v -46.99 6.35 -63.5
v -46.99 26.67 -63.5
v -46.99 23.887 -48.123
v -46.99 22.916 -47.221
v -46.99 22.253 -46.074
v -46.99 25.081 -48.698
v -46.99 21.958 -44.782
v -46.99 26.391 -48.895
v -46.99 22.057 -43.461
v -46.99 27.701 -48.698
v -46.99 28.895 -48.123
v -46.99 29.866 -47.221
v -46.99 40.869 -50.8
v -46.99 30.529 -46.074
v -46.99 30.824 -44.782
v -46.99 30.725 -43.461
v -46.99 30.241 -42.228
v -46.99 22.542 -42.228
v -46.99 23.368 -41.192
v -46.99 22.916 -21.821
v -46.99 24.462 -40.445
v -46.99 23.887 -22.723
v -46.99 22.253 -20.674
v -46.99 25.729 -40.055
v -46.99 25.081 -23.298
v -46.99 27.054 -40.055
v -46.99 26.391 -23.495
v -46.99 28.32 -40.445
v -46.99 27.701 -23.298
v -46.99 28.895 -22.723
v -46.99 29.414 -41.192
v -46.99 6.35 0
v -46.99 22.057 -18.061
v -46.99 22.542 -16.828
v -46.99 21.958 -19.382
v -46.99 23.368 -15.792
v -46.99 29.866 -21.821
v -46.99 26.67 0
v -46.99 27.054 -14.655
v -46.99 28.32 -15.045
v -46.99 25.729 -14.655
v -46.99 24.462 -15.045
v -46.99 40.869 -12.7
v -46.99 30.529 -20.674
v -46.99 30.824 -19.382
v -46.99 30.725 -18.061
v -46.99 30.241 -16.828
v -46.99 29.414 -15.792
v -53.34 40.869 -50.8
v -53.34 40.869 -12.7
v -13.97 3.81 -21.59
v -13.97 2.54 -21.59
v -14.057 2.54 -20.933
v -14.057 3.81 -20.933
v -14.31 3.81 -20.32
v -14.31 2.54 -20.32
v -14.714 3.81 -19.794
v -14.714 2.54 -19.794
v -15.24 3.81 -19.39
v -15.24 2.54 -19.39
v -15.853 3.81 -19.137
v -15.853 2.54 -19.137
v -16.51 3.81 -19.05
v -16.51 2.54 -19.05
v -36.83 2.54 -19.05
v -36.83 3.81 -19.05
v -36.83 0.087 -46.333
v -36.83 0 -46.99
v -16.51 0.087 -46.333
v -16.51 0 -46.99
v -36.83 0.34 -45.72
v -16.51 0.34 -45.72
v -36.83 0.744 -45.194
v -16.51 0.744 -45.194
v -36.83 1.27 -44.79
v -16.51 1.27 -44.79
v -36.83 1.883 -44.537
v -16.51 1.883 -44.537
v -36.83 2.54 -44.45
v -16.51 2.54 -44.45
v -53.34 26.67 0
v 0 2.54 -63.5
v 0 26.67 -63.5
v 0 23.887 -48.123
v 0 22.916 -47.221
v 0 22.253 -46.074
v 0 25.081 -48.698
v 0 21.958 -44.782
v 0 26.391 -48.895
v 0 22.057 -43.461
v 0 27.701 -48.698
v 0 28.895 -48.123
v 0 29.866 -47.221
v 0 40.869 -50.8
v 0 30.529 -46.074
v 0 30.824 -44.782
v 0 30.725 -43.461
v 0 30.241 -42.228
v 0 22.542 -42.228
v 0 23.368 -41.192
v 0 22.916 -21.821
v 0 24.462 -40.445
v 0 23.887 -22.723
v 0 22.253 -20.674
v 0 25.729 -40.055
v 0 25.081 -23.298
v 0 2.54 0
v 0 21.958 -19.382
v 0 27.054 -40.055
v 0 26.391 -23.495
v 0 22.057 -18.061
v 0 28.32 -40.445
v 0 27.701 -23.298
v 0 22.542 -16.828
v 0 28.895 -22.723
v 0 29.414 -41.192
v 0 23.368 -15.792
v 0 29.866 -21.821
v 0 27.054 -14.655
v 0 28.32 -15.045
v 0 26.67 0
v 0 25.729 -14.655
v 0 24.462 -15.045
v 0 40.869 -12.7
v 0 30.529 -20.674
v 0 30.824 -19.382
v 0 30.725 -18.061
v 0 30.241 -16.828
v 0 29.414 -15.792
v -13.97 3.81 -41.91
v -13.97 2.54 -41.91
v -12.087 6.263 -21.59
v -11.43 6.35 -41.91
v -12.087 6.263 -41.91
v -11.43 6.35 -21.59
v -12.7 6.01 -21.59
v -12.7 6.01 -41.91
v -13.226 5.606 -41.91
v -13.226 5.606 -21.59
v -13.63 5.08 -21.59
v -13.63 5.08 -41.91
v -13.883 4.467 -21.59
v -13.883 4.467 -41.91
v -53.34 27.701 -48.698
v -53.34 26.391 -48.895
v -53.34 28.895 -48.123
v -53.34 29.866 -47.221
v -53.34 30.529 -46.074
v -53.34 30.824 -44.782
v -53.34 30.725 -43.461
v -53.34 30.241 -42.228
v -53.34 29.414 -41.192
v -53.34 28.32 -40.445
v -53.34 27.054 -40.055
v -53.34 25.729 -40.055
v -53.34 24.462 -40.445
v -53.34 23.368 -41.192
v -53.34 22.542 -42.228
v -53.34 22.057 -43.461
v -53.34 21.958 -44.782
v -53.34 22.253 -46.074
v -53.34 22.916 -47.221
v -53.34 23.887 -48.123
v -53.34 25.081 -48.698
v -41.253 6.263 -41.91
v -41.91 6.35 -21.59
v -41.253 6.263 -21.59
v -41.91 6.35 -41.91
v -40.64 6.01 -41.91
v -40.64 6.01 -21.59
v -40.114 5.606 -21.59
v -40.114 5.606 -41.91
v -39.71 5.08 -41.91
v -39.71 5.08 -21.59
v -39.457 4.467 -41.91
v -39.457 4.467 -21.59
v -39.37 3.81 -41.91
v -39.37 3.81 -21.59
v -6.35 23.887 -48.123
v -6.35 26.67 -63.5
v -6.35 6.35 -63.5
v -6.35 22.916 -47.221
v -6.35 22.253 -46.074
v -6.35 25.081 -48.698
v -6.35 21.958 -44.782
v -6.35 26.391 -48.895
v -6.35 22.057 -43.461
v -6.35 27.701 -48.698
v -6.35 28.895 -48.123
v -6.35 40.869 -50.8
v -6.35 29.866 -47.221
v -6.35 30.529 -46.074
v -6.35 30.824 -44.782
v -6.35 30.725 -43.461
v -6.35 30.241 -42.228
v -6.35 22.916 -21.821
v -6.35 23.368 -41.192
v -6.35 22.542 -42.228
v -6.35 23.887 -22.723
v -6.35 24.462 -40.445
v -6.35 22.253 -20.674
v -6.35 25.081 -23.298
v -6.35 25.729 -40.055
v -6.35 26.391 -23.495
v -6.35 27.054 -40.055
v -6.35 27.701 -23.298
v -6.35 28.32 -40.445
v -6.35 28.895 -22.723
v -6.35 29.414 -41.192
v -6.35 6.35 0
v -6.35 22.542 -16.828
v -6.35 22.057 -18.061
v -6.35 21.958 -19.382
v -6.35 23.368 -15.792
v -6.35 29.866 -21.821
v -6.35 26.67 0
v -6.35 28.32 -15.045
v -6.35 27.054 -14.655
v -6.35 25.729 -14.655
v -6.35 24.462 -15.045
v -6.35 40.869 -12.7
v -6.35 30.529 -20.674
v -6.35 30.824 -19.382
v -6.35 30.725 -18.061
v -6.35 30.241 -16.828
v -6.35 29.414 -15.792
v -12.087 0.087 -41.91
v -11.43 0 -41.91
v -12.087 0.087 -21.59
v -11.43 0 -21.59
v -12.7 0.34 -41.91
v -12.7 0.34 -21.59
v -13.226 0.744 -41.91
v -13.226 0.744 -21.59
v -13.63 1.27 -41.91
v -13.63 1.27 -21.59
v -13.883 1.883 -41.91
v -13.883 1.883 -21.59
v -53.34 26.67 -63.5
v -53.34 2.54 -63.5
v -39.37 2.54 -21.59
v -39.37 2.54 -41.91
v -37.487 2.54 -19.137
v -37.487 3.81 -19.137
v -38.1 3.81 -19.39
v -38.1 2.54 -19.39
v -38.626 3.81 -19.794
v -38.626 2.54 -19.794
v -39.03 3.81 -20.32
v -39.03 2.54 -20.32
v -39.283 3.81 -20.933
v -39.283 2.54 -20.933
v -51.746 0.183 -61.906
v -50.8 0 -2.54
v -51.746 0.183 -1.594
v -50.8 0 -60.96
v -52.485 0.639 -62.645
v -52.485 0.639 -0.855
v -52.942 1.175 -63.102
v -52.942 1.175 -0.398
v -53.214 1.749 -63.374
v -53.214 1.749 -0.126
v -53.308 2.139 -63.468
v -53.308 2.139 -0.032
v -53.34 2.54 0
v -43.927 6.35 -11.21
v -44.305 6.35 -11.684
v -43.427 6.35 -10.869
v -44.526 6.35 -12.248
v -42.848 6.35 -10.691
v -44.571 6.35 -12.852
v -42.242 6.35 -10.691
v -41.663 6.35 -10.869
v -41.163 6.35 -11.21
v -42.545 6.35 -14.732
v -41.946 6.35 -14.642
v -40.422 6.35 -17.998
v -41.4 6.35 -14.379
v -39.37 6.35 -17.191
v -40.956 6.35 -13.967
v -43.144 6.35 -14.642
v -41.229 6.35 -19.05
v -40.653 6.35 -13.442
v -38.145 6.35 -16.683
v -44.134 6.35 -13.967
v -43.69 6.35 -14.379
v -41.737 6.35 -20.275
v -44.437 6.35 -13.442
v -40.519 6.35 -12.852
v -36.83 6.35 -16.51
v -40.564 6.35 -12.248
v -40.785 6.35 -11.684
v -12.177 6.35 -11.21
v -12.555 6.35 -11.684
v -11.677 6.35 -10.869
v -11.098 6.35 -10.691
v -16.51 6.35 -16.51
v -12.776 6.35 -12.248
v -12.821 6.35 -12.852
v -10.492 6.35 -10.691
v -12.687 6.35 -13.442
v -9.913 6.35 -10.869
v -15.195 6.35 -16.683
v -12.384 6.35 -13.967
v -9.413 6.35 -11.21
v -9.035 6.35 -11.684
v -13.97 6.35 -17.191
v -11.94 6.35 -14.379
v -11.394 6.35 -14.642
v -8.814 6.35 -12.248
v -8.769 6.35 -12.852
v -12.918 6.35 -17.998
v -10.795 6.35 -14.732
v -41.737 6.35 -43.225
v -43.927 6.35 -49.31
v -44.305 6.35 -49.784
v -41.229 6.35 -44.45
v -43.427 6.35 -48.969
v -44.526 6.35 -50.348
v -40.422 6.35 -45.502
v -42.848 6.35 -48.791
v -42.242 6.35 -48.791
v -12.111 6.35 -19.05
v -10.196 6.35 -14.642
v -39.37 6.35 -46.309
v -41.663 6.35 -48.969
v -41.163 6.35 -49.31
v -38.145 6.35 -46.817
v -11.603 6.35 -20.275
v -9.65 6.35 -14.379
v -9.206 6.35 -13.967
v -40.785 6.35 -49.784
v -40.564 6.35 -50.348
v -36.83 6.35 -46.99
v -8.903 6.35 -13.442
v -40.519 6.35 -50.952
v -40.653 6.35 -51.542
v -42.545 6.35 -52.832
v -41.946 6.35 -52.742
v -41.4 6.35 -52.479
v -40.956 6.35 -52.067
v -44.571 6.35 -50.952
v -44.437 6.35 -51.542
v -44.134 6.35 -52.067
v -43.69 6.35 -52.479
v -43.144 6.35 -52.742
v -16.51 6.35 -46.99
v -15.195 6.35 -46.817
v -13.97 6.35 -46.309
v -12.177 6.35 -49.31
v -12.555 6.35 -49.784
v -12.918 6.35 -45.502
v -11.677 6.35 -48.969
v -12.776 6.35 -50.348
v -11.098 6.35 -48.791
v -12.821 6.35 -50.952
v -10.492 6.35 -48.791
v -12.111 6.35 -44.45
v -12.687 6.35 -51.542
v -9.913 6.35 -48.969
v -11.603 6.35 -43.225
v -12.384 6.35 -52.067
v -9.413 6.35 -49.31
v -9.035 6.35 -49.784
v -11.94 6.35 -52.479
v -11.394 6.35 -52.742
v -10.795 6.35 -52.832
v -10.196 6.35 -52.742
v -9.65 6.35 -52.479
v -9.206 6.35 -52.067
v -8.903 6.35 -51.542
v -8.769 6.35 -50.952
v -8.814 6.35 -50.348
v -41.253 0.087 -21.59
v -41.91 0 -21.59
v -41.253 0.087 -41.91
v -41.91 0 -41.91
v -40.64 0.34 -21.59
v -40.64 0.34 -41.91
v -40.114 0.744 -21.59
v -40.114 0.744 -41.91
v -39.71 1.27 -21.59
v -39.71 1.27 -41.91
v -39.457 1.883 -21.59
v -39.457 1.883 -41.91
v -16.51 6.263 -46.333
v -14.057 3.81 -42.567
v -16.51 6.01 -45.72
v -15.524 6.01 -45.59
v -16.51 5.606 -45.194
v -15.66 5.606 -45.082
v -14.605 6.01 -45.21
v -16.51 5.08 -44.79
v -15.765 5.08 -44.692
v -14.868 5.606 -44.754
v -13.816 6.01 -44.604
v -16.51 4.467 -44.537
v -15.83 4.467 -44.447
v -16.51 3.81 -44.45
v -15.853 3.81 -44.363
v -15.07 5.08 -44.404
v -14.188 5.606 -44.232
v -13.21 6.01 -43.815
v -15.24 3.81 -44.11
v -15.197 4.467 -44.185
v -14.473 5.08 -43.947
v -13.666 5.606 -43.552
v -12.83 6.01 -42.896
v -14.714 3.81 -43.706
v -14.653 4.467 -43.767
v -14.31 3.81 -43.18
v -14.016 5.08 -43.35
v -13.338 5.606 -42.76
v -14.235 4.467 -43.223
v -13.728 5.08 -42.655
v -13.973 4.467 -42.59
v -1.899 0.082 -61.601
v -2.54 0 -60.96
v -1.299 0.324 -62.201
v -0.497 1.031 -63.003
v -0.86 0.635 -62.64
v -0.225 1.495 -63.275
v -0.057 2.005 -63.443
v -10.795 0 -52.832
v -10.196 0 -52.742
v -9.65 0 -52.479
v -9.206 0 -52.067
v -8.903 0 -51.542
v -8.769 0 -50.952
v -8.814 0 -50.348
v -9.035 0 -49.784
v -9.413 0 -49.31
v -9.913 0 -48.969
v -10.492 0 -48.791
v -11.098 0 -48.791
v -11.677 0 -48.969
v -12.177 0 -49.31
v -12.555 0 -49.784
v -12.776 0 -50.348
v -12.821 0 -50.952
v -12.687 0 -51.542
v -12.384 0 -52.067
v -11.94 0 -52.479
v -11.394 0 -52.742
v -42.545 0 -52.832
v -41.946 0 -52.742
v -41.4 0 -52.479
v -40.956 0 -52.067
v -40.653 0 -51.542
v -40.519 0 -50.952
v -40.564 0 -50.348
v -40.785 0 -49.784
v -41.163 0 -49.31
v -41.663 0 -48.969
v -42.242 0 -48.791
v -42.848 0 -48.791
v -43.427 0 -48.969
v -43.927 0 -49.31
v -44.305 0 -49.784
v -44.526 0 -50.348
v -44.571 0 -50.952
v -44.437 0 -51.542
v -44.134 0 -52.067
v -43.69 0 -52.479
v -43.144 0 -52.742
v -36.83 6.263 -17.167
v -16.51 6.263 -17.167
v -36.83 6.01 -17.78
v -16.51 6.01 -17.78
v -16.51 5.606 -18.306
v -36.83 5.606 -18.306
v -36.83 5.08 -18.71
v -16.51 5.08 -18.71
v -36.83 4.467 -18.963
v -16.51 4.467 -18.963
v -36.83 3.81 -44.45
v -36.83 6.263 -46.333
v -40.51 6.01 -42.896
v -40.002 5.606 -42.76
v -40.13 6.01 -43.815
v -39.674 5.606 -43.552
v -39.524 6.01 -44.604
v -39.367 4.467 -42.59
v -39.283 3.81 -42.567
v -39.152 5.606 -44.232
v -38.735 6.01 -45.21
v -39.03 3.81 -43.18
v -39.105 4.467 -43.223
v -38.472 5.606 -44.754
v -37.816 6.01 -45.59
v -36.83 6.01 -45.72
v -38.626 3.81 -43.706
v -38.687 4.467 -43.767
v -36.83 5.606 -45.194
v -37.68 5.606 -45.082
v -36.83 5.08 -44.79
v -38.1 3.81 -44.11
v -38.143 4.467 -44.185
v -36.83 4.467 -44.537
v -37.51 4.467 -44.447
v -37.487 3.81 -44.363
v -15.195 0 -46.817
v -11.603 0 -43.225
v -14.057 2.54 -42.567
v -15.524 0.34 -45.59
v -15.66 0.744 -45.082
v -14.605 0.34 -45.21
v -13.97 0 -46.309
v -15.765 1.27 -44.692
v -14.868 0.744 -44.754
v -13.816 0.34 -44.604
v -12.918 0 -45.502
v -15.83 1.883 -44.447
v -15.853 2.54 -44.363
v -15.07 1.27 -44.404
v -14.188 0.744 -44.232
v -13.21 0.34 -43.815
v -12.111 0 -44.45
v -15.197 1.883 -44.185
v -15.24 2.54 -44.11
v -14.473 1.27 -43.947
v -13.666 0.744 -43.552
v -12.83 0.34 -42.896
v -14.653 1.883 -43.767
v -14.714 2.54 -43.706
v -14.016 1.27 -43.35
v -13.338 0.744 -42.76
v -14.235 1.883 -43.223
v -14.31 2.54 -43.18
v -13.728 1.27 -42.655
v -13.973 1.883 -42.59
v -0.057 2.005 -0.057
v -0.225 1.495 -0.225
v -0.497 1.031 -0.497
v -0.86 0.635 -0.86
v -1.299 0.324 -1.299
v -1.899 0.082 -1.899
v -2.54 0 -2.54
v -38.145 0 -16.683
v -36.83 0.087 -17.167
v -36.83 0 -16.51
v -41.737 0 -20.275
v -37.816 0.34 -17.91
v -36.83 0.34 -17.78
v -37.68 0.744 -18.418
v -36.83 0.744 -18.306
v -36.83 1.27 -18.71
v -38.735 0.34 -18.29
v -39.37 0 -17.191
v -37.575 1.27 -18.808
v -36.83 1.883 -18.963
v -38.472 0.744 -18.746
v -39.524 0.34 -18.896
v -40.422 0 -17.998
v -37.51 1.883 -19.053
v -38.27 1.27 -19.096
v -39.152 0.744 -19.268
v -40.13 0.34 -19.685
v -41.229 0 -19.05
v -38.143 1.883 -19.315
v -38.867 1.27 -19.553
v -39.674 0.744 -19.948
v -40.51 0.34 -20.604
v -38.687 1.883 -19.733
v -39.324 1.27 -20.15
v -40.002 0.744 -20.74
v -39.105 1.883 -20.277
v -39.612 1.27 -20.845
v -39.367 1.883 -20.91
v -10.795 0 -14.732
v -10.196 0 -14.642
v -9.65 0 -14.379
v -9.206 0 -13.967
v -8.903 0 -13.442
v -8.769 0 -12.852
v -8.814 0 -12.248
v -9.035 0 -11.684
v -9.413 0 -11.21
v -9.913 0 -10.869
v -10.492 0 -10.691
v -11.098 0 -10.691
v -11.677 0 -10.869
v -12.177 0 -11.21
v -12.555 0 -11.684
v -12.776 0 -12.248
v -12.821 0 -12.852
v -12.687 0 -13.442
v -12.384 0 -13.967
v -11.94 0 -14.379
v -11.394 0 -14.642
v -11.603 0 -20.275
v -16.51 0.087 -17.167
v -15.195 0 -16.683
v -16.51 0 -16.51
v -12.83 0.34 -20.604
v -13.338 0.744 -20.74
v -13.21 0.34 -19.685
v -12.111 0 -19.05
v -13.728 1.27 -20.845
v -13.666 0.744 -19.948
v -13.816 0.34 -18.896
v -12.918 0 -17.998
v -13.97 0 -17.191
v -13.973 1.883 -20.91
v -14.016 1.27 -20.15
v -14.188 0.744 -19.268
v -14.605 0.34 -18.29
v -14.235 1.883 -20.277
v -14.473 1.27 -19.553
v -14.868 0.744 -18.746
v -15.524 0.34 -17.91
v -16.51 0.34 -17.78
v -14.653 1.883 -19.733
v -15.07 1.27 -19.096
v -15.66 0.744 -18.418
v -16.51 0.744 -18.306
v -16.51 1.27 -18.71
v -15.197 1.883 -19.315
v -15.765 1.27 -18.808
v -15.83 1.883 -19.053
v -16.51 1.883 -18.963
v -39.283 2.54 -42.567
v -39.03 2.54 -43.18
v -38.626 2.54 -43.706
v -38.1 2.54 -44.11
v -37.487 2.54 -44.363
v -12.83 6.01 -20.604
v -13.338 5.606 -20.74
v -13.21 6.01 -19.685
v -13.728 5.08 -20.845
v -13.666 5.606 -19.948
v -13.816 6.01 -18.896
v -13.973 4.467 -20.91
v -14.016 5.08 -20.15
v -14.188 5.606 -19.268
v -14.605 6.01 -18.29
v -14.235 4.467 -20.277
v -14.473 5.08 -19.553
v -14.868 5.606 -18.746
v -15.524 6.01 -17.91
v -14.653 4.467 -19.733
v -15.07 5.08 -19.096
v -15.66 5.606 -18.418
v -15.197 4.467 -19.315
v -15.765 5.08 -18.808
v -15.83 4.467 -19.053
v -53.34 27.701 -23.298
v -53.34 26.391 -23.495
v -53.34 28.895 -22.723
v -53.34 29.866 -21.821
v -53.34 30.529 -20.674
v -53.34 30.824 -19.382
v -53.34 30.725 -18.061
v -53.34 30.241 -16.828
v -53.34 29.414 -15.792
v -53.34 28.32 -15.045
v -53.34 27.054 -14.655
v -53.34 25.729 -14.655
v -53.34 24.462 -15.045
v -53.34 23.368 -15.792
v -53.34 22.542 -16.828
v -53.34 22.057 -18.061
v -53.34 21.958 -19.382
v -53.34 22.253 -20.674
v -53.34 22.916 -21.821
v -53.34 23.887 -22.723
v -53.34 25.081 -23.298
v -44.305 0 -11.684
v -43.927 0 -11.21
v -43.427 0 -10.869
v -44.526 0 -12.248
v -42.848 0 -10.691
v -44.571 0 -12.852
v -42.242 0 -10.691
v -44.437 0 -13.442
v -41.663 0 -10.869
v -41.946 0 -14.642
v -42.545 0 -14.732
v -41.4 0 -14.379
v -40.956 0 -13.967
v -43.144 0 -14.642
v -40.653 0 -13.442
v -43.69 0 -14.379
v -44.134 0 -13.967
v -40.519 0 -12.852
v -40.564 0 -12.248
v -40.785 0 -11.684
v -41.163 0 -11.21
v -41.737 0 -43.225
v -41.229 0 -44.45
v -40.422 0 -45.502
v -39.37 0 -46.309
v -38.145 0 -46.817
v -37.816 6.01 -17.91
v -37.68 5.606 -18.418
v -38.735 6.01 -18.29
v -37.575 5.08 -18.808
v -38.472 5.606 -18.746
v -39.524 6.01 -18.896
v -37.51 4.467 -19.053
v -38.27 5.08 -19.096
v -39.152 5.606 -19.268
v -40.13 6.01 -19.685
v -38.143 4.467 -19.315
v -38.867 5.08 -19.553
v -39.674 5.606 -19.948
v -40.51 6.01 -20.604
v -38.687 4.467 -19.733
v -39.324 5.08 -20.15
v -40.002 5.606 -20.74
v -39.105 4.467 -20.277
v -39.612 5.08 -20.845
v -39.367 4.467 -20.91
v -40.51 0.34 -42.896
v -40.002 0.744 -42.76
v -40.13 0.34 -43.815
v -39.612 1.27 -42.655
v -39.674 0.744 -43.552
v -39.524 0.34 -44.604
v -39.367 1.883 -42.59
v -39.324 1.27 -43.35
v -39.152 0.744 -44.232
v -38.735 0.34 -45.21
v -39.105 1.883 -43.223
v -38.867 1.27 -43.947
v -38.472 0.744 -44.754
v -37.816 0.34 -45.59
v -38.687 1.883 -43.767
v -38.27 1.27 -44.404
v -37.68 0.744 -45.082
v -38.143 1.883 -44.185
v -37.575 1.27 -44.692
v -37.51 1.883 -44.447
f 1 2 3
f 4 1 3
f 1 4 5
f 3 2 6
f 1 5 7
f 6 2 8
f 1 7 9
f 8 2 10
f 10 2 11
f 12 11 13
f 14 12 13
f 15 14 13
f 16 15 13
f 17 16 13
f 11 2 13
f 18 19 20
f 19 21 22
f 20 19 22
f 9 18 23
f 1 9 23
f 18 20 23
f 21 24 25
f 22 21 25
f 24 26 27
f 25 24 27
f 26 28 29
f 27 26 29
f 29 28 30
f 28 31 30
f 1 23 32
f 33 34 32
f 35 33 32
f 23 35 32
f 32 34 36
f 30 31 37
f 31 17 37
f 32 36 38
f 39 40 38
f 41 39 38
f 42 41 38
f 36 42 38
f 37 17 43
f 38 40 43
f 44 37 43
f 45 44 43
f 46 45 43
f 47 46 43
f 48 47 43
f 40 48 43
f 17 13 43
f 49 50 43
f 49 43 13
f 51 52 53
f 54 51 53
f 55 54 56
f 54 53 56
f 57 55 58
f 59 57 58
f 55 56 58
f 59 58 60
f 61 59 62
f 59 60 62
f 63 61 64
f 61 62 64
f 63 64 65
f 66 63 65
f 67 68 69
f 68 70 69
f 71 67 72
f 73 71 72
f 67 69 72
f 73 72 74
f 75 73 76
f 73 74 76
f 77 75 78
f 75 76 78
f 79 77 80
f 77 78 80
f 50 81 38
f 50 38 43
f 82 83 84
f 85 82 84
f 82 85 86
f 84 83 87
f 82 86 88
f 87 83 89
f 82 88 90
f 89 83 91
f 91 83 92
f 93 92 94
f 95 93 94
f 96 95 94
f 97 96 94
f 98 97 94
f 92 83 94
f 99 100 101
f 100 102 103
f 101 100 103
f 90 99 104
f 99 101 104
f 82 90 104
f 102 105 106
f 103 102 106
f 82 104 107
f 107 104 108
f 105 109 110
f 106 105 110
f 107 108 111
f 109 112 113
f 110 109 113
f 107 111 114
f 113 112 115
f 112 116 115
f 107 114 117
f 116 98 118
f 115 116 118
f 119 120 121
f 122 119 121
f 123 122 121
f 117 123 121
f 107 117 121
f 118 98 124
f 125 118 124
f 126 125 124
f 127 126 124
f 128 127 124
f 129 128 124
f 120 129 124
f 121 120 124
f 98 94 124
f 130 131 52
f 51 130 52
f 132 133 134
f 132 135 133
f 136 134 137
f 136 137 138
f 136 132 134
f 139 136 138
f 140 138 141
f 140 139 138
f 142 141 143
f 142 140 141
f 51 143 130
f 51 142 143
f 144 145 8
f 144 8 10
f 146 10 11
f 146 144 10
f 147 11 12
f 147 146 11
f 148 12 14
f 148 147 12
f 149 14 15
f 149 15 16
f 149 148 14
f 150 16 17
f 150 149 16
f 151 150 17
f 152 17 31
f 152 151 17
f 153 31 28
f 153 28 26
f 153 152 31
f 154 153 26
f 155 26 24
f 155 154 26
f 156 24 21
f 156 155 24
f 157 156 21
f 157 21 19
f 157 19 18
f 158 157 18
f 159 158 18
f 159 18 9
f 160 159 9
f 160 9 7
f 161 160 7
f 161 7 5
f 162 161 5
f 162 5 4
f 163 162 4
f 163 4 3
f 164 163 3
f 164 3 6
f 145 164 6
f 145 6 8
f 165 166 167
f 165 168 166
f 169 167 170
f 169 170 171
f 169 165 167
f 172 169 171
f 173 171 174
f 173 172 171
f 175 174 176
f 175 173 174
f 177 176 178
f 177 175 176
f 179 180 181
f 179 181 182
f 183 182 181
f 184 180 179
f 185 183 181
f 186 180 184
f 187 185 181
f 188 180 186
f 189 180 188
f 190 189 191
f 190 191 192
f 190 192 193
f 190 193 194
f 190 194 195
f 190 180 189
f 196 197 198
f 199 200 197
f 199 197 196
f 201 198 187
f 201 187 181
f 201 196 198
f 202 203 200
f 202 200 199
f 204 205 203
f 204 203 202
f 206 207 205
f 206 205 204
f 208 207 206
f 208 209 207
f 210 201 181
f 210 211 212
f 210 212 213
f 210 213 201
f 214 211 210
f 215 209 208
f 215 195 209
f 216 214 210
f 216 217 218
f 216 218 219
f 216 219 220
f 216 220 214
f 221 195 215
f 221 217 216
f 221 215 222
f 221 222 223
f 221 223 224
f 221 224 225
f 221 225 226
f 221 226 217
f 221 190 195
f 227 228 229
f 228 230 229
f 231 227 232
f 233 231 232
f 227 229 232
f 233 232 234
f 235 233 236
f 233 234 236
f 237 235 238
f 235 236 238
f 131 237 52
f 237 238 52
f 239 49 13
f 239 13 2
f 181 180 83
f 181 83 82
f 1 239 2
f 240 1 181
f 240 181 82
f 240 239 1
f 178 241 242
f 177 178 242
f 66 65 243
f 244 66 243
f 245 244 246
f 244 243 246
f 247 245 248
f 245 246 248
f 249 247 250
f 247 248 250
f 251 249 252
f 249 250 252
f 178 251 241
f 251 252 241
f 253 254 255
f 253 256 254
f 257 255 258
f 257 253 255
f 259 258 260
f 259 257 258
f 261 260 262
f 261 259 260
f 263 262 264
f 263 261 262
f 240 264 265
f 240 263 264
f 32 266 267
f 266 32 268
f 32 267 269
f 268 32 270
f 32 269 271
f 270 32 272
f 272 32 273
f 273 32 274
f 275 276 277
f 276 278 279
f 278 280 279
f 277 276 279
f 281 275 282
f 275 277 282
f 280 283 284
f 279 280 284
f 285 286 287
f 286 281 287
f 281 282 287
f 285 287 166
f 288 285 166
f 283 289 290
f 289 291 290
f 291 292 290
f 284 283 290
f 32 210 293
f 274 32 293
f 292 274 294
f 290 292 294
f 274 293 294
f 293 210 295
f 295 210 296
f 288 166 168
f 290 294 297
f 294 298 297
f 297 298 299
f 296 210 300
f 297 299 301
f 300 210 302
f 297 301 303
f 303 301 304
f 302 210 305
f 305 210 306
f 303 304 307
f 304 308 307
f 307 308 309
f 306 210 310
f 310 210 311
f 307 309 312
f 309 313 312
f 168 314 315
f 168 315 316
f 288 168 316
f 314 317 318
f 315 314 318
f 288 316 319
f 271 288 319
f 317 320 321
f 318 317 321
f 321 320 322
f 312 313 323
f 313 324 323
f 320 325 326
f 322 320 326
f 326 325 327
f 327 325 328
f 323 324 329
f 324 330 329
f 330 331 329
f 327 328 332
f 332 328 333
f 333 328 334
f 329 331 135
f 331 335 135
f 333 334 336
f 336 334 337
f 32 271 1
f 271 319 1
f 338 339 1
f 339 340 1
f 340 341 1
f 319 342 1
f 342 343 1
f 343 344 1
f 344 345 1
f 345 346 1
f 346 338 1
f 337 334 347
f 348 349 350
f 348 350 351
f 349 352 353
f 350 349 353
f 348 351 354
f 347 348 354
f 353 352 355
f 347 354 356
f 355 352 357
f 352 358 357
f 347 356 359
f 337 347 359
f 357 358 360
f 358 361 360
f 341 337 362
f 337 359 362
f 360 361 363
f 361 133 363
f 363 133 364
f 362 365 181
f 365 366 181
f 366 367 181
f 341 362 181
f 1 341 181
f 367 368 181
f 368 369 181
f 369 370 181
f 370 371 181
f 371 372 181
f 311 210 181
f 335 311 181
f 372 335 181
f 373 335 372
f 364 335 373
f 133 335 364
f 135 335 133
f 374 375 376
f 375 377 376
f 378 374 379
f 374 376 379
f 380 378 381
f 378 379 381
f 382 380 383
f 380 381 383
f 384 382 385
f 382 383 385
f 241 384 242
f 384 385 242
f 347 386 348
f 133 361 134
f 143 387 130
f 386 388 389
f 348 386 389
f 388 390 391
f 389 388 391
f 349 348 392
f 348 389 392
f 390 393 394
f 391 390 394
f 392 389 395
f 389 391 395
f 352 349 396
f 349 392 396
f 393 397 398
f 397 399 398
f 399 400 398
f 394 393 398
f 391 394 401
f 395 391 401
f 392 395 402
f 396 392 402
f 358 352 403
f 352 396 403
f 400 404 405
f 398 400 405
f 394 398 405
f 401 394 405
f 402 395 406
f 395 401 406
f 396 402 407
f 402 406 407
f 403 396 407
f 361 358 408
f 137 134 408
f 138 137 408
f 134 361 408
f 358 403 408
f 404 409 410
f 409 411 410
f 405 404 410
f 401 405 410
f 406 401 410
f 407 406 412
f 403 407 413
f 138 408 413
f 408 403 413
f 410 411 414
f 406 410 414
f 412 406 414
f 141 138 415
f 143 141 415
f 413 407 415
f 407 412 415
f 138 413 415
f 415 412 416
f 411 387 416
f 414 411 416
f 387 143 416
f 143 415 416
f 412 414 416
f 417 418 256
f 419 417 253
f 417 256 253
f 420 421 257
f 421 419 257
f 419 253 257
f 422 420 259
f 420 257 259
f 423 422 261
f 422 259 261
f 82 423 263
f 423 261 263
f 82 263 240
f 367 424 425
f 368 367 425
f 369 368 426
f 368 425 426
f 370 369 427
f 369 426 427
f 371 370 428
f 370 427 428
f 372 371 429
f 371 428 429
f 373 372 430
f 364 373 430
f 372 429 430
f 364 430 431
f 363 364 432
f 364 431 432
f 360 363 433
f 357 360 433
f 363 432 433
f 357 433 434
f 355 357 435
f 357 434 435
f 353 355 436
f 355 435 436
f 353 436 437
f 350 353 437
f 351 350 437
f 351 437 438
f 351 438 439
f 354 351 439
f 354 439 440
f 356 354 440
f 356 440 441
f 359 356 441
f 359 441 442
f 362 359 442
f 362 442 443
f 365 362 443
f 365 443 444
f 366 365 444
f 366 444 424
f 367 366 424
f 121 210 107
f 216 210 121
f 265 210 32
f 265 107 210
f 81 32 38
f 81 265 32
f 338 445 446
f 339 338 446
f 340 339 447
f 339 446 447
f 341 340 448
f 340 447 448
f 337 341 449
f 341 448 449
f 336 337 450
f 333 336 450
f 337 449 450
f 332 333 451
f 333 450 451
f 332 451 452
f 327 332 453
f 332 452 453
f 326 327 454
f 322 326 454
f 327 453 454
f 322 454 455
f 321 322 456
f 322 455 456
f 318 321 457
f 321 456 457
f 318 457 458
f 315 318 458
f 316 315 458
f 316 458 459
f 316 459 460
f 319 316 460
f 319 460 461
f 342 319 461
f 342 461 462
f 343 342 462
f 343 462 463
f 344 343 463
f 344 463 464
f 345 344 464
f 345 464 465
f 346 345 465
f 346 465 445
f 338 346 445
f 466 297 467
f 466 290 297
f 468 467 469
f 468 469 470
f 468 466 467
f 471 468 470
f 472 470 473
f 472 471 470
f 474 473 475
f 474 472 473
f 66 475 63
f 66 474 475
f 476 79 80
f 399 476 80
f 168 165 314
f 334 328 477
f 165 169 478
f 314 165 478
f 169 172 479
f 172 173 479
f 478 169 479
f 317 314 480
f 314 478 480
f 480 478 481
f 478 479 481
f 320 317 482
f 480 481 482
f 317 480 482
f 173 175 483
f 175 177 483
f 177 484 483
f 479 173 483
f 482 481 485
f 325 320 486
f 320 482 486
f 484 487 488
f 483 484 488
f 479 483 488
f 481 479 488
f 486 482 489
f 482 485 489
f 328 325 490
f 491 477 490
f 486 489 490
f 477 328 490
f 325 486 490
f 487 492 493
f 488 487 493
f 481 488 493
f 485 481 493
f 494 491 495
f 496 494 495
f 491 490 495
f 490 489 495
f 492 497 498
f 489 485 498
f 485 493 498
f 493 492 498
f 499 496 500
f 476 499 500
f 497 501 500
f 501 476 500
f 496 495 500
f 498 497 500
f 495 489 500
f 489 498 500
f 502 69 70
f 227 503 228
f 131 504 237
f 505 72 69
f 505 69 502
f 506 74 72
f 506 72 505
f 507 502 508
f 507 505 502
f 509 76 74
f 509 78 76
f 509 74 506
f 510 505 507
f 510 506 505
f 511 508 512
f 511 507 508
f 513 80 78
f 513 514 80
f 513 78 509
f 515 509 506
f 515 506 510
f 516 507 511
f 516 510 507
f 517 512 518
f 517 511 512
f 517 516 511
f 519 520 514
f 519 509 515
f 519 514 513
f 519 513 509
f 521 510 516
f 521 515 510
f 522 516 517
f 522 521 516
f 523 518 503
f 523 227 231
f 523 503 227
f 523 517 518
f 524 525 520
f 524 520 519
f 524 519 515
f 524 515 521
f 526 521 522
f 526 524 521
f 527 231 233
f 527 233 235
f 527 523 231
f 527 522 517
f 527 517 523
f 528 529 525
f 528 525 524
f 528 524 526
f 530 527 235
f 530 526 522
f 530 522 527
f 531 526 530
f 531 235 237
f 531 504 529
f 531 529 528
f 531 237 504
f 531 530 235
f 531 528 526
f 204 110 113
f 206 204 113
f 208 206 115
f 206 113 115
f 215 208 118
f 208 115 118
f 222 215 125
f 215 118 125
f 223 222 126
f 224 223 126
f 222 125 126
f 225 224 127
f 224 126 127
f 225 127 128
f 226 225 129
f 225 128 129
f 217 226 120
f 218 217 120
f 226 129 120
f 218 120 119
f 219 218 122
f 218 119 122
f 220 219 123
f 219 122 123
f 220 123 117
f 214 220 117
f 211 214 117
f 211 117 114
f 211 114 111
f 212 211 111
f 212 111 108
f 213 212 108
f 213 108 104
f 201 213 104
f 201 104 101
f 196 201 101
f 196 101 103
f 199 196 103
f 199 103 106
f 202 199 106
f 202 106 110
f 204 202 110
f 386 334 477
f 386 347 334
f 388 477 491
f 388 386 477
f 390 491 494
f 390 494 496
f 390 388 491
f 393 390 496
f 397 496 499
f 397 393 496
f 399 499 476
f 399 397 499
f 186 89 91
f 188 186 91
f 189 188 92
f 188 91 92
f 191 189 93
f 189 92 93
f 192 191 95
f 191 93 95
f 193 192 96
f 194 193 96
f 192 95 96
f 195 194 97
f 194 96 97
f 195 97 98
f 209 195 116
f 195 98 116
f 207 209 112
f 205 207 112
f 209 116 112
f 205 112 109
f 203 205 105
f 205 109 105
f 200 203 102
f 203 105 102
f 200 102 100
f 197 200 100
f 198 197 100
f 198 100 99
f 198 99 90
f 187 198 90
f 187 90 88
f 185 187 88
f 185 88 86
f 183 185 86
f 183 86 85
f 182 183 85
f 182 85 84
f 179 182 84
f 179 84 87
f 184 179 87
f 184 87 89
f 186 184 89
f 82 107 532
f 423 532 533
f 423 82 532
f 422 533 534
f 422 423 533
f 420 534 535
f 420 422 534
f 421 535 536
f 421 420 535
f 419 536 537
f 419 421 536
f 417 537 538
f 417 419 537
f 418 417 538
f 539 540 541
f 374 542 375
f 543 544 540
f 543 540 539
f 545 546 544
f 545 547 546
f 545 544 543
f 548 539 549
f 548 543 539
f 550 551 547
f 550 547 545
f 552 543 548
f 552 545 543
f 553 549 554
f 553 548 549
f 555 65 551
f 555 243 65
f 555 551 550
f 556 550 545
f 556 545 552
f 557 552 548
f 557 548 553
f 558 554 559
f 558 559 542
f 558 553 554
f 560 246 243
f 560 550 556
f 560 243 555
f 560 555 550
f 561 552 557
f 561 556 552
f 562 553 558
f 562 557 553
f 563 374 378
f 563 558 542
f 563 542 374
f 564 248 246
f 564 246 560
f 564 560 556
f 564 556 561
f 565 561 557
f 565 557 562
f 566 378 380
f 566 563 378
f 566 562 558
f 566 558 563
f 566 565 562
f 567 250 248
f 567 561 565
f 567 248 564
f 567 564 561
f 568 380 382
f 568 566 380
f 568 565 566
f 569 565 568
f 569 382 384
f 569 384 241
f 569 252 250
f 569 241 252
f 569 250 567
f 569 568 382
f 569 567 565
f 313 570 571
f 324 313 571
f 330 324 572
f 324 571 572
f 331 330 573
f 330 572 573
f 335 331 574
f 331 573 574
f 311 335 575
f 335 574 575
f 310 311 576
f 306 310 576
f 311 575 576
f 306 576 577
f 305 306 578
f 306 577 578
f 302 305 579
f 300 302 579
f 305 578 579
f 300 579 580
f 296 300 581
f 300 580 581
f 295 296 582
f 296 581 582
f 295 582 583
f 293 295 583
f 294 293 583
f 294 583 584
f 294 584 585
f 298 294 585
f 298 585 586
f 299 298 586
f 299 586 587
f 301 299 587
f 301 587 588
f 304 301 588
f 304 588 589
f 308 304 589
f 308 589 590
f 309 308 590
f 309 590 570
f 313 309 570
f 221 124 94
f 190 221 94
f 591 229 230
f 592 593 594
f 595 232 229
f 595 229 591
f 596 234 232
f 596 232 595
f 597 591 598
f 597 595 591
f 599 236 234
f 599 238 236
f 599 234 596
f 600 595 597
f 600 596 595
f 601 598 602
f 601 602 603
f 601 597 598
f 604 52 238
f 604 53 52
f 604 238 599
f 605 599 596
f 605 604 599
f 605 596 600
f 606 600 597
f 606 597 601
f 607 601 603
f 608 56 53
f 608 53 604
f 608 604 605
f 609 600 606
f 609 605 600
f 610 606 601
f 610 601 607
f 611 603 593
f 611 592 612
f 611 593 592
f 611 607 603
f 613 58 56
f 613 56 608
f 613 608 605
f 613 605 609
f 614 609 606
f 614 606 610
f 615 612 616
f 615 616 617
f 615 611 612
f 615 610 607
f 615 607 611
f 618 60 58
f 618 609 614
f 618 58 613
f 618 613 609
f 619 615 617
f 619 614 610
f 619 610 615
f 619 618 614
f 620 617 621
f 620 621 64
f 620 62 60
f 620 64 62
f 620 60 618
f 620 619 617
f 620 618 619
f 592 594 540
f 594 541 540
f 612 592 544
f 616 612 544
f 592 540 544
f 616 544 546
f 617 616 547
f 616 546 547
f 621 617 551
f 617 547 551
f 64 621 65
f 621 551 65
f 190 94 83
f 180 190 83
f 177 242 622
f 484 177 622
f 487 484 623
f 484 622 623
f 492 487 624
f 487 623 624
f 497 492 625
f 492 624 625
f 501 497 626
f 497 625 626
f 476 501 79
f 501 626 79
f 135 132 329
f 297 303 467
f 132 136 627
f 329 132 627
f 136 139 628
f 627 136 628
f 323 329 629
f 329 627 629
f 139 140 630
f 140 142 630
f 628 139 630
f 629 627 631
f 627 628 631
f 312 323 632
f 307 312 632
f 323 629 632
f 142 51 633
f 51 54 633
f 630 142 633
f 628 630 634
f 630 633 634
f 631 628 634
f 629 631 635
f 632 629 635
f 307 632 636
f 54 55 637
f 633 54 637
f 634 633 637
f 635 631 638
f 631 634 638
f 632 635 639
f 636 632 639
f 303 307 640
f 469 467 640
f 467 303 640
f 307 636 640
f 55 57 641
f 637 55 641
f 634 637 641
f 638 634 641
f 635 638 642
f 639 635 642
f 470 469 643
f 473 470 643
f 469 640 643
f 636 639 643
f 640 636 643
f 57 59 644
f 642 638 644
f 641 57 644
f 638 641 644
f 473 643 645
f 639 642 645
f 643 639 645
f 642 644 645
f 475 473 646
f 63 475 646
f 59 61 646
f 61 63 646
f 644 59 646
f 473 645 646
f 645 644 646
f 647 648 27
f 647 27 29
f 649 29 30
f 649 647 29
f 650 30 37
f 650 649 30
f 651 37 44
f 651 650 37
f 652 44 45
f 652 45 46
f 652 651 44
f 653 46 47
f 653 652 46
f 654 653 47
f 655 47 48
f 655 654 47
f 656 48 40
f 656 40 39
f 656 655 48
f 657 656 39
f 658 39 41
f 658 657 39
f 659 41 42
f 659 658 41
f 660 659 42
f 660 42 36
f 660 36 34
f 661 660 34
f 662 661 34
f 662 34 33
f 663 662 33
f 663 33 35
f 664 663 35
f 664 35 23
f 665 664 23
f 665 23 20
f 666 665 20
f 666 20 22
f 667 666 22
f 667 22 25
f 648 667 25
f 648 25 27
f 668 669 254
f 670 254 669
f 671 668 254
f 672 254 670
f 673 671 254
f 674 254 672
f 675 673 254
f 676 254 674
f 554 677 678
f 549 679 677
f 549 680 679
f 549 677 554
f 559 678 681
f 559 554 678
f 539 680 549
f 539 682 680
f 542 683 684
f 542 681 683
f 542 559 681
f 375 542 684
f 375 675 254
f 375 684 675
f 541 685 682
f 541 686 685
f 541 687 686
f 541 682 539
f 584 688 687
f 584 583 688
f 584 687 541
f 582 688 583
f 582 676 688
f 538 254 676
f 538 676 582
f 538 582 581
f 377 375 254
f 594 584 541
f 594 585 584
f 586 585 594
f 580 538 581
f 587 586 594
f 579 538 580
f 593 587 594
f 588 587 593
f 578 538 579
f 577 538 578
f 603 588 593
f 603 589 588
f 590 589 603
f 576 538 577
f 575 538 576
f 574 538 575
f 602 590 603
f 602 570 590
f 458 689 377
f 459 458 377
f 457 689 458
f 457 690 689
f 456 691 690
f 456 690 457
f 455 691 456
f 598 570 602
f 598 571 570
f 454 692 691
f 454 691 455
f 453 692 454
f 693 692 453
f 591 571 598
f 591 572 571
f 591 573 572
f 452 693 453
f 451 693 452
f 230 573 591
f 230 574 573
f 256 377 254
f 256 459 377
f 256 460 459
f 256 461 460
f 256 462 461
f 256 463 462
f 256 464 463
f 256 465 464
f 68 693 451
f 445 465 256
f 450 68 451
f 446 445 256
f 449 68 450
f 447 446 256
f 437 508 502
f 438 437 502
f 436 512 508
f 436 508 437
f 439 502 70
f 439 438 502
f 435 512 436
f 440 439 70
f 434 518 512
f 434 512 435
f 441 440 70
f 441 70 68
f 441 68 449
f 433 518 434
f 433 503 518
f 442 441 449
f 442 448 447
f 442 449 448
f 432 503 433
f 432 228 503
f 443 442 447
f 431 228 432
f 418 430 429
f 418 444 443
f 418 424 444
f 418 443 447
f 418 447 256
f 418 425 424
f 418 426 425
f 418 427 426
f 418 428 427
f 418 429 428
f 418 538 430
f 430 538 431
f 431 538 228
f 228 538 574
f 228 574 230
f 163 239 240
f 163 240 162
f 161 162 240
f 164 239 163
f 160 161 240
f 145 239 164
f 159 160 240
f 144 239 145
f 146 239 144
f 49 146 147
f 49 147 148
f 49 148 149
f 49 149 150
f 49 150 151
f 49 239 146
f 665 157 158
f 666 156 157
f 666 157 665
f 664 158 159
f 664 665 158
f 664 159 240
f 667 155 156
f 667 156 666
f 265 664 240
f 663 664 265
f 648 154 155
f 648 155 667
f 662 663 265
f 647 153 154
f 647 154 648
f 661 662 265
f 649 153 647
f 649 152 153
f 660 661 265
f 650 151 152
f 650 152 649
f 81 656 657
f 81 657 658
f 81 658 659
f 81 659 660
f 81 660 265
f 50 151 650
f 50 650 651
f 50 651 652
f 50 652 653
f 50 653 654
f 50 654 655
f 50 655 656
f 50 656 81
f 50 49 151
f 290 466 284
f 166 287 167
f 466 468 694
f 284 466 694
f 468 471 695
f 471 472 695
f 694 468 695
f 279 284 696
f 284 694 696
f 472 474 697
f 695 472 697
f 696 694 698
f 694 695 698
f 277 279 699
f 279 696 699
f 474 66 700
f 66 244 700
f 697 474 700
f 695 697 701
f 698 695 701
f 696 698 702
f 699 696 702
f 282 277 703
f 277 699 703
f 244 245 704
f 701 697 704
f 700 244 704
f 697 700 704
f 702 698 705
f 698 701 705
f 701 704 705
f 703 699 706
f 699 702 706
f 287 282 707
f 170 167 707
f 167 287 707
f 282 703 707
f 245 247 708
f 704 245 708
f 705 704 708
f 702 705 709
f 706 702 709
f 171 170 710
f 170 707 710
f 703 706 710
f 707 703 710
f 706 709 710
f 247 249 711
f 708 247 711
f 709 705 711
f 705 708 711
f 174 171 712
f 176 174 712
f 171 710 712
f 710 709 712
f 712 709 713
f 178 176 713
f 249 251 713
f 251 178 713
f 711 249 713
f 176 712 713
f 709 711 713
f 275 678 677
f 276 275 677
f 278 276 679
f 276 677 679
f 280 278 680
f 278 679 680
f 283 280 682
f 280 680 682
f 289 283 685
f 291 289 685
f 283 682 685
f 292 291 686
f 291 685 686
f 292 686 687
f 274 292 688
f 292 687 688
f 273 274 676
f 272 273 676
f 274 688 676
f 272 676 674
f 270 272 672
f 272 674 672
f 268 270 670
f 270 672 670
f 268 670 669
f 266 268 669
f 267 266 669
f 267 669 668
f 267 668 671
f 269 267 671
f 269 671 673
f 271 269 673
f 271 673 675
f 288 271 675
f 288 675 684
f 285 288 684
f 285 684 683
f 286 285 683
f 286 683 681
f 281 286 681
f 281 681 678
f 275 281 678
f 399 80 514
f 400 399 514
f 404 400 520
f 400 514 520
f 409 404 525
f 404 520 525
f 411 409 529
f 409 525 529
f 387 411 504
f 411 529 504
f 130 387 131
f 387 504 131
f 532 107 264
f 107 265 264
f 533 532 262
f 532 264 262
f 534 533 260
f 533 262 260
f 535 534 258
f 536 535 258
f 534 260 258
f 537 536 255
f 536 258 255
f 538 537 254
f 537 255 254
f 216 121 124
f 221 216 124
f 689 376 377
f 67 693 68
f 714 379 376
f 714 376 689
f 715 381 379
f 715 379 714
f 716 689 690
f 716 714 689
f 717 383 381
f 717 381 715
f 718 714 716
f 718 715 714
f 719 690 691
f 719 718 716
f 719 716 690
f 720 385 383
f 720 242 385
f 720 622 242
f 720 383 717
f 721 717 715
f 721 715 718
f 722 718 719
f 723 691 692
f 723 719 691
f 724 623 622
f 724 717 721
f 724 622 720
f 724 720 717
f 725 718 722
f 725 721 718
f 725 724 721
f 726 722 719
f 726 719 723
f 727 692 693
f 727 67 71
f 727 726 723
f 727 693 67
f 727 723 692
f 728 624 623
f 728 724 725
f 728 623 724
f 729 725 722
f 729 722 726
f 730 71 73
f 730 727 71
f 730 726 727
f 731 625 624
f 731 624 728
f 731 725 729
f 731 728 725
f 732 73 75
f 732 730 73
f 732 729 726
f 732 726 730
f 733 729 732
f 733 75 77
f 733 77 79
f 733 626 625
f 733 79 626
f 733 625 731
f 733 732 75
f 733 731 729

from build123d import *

# Parameters (mm, degrees)
SKETCH1_W           = 63.5
SKETCH1_H           = 6.35
BOSS_EXTRUDE1_DEPTH = 53.34
BOSS_EXTRUDE2_DEPTH = 6.35
CUT_EXTRUDE1_REACH  = 94.454
SKETCH11_R          = 4.445
FILLET1_R           = 2.54
CUT_EXTRUDE2_REACH  = 94.454
SKETCH19_R          = 2.032
CUT_EXTRUDE3_DEPTH  = 6.35
FILLET2_R           = 2.54


with BuildPart() as part:
    # Sketch1 → Boss-Extrude1 (new body)
    with BuildSketch(Plane(origin=(0, 0, 0), x_dir=(0, 0, -1), z_dir=(1, 0, 0))):
        with Locations((31.75, 3.175)):
            Rectangle(SKETCH1_W, SKETCH1_H)
    extrude(amount=-BOSS_EXTRUDE1_DEPTH)

    # Sketch2 → Boss-Extrude2 (add)
    with BuildSketch(Plane(origin=(0, 0, 0), x_dir=(0, 0, -1), z_dir=(1, 0, 0))):
        Polygon((0, 6.35), (0, 26.67), (12.7, 40.869031657), (50.8, 40.869031657), (63.5, 26.67), (63.5, 6.35), align=None)
    boss_extrude2 = extrude(amount=-BOSS_EXTRUDE2_DEPTH)

    # Sketch11 → Cut-Extrude1 (cut, up to next)
    with BuildSketch(Plane(origin=(0, 0, 0), x_dir=(0, 0, -1), z_dir=(1, 0, 0)), mode=Mode.PRIVATE) as cut_extrude1_sk1:
        with Locations((19.05, 26.391031657)):
            Circle(SKETCH11_R)
    cut_extrude1_tool1 = extrude(cut_extrude1_sk1.sketch, amount=-CUT_EXTRUDE1_REACH, mode=Mode.PRIVATE) & part.part
    # Sketch11 → Cut-Extrude1 (cut, up to next)
    with BuildSketch(Plane(origin=(0, 0, 0), x_dir=(0, 0, -1), z_dir=(1, 0, 0)), mode=Mode.PRIVATE) as cut_extrude1_sk2:
        with Locations((44.45, 26.391031657)):
            Circle(SKETCH11_R)
    cut_extrude1_tool2 = extrude(cut_extrude1_sk2.sketch, amount=-CUT_EXTRUDE1_REACH, mode=Mode.PRIVATE) & part.part
    cut_extrude1_1 = cut_extrude1_tool1.solids().sort_by_distance((0, 26.391032, -19.05))[0]
    add(cut_extrude1_1, mode=Mode.SUBTRACT)
    cut_extrude1_2 = cut_extrude1_tool2.solids().sort_by_distance((0, 26.391032, -44.45))[0]
    add(cut_extrude1_2, mode=Mode.SUBTRACT)
    cut_extrude1 = cut_extrude1_1 + cut_extrude1_2  # Cut-Extrude1 as one shape, for the pattern or mirror that repeats it

    # Fillet1
    fillet1_edges = [part.edges().sort_by_distance(p)[0] for p in [
        (0, 0, -31.75),
        (-53.34, 0, -31.75),
        (-26.67, 0, -63.5),
        (-26.67, 0, 0),
    ]]
    fillet(fillet1_edges, radius=FILLET1_R)

    # Sketch19 → Cut-Extrude2 (cut, up to next)
    with BuildSketch(Plane.XZ, mode=Mode.PRIVATE) as cut_extrude2_sk1:
        with Locations(Location((-10.795, -50.8, 0), (0, 0, 270))):
            Circle(SKETCH19_R)
    cut_extrude2_tool1 = extrude(cut_extrude2_sk1.sketch, amount=-CUT_EXTRUDE2_REACH, mode=Mode.PRIVATE) & part.part
    # Sketch19 → Cut-Extrude2 (cut, up to next)
    with BuildSketch(Plane.XZ, mode=Mode.PRIVATE) as cut_extrude2_sk2:
        with Locations(Location((-42.545, -50.8, 0), (0, 0, 270))):
            Circle(SKETCH19_R)
    cut_extrude2_tool2 = extrude(cut_extrude2_sk2.sketch, amount=-CUT_EXTRUDE2_REACH, mode=Mode.PRIVATE) & part.part
    # Sketch19 → Cut-Extrude2 (cut, up to next)
    with BuildSketch(Plane.XZ, mode=Mode.PRIVATE) as cut_extrude2_sk3:
        with Locations(Location((-42.545, -12.7, 0), (0, 0, 270))):
            Circle(SKETCH19_R)
    cut_extrude2_tool3 = extrude(cut_extrude2_sk3.sketch, amount=-CUT_EXTRUDE2_REACH, mode=Mode.PRIVATE) & part.part
    # Sketch19 → Cut-Extrude2 (cut, up to next)
    with BuildSketch(Plane.XZ, mode=Mode.PRIVATE) as cut_extrude2_sk4:
        with Locations(Location((-10.795, -12.7, 0), (0, 0, 270))):
            Circle(SKETCH19_R)
    cut_extrude2_tool4 = extrude(cut_extrude2_sk4.sketch, amount=-CUT_EXTRUDE2_REACH, mode=Mode.PRIVATE) & part.part
    add(cut_extrude2_tool1.solids().sort_by_distance((-10.795, 0, -50.8))[0], mode=Mode.SUBTRACT)
    add(cut_extrude2_tool2.solids().sort_by_distance((-42.545, 0, -50.8))[0], mode=Mode.SUBTRACT)
    add(cut_extrude2_tool3.solids().sort_by_distance((-42.545, 0, -12.7))[0], mode=Mode.SUBTRACT)
    add(cut_extrude2_tool4.solids().sort_by_distance((-10.795, 0, -12.7))[0], mode=Mode.SUBTRACT)

    # Mirror1: Boss-Extrude2, Cut-Extrude1 across plane
    add(boss_extrude2.mirror(Plane(origin=(-26.67, 0, 0), x_dir=(0, 0, 1), z_dir=(1, 0, 0))))
    add(cut_extrude1.mirror(Plane(origin=(-26.67, 0, 0), x_dir=(0, 0, 1), z_dir=(1, 0, 0))), mode=Mode.SUBTRACT)

    # Sketch20 → Cut-Extrude3 (cut)
    with BuildSketch(Plane.XZ):
        with BuildLine():
            Line((-16.51, -19.05), (-36.83, -19.05))
            ThreePointArc((-36.83, -19.05), (-38.626051224, -19.793948776), (-39.37, -21.59))
            Line((-39.37, -21.59), (-39.37, -41.91))
            ThreePointArc((-39.37, -41.91), (-38.626051224, -43.706051224), (-36.83, -44.45))
            Line((-36.83, -44.45), (-16.51, -44.45))
            ThreePointArc((-16.51, -44.45), (-14.713948776, -43.706051224), (-13.97, -41.91))
            Line((-13.97, -41.91), (-13.97, -21.59))
            ThreePointArc((-13.97, -21.59), (-14.713948776, -19.793948776), (-16.51, -19.05))
        make_face()
    extrude(amount=-CUT_EXTRUDE3_DEPTH, mode=Mode.SUBTRACT)

    # Fillet2
    fillet2_edges = [part.edges().sort_by_distance(p)[0] for p in [
        (-38.626051224, 0, -43.706051224),
        (-26.67, 0, -44.45),
        (-14.713948776, 0, -43.706051224),
        (-13.97, 0, -31.75),
        (-14.713948776, 0, -19.793948776),
        (-26.67, 0, -19.05),
        (-38.626051224, 0, -19.793948776),
        (-39.37, 0, -31.75),
        (-26.67, 6.35, -44.45),
        (-14.713948776, 6.35, -43.706051224),
        (-13.97, 6.35, -31.75),
        (-14.713948776, 6.35, -19.793948776),
        (-26.67, 6.35, -19.05),
        (-38.626051224, 6.35, -19.793948776),
        (-39.37, 6.35, -31.75),
        (-38.626051224, 6.35, -43.706051224),
    ]]
    fillet(fillet2_edges, radius=FILLET2_R)


solid = part.part
